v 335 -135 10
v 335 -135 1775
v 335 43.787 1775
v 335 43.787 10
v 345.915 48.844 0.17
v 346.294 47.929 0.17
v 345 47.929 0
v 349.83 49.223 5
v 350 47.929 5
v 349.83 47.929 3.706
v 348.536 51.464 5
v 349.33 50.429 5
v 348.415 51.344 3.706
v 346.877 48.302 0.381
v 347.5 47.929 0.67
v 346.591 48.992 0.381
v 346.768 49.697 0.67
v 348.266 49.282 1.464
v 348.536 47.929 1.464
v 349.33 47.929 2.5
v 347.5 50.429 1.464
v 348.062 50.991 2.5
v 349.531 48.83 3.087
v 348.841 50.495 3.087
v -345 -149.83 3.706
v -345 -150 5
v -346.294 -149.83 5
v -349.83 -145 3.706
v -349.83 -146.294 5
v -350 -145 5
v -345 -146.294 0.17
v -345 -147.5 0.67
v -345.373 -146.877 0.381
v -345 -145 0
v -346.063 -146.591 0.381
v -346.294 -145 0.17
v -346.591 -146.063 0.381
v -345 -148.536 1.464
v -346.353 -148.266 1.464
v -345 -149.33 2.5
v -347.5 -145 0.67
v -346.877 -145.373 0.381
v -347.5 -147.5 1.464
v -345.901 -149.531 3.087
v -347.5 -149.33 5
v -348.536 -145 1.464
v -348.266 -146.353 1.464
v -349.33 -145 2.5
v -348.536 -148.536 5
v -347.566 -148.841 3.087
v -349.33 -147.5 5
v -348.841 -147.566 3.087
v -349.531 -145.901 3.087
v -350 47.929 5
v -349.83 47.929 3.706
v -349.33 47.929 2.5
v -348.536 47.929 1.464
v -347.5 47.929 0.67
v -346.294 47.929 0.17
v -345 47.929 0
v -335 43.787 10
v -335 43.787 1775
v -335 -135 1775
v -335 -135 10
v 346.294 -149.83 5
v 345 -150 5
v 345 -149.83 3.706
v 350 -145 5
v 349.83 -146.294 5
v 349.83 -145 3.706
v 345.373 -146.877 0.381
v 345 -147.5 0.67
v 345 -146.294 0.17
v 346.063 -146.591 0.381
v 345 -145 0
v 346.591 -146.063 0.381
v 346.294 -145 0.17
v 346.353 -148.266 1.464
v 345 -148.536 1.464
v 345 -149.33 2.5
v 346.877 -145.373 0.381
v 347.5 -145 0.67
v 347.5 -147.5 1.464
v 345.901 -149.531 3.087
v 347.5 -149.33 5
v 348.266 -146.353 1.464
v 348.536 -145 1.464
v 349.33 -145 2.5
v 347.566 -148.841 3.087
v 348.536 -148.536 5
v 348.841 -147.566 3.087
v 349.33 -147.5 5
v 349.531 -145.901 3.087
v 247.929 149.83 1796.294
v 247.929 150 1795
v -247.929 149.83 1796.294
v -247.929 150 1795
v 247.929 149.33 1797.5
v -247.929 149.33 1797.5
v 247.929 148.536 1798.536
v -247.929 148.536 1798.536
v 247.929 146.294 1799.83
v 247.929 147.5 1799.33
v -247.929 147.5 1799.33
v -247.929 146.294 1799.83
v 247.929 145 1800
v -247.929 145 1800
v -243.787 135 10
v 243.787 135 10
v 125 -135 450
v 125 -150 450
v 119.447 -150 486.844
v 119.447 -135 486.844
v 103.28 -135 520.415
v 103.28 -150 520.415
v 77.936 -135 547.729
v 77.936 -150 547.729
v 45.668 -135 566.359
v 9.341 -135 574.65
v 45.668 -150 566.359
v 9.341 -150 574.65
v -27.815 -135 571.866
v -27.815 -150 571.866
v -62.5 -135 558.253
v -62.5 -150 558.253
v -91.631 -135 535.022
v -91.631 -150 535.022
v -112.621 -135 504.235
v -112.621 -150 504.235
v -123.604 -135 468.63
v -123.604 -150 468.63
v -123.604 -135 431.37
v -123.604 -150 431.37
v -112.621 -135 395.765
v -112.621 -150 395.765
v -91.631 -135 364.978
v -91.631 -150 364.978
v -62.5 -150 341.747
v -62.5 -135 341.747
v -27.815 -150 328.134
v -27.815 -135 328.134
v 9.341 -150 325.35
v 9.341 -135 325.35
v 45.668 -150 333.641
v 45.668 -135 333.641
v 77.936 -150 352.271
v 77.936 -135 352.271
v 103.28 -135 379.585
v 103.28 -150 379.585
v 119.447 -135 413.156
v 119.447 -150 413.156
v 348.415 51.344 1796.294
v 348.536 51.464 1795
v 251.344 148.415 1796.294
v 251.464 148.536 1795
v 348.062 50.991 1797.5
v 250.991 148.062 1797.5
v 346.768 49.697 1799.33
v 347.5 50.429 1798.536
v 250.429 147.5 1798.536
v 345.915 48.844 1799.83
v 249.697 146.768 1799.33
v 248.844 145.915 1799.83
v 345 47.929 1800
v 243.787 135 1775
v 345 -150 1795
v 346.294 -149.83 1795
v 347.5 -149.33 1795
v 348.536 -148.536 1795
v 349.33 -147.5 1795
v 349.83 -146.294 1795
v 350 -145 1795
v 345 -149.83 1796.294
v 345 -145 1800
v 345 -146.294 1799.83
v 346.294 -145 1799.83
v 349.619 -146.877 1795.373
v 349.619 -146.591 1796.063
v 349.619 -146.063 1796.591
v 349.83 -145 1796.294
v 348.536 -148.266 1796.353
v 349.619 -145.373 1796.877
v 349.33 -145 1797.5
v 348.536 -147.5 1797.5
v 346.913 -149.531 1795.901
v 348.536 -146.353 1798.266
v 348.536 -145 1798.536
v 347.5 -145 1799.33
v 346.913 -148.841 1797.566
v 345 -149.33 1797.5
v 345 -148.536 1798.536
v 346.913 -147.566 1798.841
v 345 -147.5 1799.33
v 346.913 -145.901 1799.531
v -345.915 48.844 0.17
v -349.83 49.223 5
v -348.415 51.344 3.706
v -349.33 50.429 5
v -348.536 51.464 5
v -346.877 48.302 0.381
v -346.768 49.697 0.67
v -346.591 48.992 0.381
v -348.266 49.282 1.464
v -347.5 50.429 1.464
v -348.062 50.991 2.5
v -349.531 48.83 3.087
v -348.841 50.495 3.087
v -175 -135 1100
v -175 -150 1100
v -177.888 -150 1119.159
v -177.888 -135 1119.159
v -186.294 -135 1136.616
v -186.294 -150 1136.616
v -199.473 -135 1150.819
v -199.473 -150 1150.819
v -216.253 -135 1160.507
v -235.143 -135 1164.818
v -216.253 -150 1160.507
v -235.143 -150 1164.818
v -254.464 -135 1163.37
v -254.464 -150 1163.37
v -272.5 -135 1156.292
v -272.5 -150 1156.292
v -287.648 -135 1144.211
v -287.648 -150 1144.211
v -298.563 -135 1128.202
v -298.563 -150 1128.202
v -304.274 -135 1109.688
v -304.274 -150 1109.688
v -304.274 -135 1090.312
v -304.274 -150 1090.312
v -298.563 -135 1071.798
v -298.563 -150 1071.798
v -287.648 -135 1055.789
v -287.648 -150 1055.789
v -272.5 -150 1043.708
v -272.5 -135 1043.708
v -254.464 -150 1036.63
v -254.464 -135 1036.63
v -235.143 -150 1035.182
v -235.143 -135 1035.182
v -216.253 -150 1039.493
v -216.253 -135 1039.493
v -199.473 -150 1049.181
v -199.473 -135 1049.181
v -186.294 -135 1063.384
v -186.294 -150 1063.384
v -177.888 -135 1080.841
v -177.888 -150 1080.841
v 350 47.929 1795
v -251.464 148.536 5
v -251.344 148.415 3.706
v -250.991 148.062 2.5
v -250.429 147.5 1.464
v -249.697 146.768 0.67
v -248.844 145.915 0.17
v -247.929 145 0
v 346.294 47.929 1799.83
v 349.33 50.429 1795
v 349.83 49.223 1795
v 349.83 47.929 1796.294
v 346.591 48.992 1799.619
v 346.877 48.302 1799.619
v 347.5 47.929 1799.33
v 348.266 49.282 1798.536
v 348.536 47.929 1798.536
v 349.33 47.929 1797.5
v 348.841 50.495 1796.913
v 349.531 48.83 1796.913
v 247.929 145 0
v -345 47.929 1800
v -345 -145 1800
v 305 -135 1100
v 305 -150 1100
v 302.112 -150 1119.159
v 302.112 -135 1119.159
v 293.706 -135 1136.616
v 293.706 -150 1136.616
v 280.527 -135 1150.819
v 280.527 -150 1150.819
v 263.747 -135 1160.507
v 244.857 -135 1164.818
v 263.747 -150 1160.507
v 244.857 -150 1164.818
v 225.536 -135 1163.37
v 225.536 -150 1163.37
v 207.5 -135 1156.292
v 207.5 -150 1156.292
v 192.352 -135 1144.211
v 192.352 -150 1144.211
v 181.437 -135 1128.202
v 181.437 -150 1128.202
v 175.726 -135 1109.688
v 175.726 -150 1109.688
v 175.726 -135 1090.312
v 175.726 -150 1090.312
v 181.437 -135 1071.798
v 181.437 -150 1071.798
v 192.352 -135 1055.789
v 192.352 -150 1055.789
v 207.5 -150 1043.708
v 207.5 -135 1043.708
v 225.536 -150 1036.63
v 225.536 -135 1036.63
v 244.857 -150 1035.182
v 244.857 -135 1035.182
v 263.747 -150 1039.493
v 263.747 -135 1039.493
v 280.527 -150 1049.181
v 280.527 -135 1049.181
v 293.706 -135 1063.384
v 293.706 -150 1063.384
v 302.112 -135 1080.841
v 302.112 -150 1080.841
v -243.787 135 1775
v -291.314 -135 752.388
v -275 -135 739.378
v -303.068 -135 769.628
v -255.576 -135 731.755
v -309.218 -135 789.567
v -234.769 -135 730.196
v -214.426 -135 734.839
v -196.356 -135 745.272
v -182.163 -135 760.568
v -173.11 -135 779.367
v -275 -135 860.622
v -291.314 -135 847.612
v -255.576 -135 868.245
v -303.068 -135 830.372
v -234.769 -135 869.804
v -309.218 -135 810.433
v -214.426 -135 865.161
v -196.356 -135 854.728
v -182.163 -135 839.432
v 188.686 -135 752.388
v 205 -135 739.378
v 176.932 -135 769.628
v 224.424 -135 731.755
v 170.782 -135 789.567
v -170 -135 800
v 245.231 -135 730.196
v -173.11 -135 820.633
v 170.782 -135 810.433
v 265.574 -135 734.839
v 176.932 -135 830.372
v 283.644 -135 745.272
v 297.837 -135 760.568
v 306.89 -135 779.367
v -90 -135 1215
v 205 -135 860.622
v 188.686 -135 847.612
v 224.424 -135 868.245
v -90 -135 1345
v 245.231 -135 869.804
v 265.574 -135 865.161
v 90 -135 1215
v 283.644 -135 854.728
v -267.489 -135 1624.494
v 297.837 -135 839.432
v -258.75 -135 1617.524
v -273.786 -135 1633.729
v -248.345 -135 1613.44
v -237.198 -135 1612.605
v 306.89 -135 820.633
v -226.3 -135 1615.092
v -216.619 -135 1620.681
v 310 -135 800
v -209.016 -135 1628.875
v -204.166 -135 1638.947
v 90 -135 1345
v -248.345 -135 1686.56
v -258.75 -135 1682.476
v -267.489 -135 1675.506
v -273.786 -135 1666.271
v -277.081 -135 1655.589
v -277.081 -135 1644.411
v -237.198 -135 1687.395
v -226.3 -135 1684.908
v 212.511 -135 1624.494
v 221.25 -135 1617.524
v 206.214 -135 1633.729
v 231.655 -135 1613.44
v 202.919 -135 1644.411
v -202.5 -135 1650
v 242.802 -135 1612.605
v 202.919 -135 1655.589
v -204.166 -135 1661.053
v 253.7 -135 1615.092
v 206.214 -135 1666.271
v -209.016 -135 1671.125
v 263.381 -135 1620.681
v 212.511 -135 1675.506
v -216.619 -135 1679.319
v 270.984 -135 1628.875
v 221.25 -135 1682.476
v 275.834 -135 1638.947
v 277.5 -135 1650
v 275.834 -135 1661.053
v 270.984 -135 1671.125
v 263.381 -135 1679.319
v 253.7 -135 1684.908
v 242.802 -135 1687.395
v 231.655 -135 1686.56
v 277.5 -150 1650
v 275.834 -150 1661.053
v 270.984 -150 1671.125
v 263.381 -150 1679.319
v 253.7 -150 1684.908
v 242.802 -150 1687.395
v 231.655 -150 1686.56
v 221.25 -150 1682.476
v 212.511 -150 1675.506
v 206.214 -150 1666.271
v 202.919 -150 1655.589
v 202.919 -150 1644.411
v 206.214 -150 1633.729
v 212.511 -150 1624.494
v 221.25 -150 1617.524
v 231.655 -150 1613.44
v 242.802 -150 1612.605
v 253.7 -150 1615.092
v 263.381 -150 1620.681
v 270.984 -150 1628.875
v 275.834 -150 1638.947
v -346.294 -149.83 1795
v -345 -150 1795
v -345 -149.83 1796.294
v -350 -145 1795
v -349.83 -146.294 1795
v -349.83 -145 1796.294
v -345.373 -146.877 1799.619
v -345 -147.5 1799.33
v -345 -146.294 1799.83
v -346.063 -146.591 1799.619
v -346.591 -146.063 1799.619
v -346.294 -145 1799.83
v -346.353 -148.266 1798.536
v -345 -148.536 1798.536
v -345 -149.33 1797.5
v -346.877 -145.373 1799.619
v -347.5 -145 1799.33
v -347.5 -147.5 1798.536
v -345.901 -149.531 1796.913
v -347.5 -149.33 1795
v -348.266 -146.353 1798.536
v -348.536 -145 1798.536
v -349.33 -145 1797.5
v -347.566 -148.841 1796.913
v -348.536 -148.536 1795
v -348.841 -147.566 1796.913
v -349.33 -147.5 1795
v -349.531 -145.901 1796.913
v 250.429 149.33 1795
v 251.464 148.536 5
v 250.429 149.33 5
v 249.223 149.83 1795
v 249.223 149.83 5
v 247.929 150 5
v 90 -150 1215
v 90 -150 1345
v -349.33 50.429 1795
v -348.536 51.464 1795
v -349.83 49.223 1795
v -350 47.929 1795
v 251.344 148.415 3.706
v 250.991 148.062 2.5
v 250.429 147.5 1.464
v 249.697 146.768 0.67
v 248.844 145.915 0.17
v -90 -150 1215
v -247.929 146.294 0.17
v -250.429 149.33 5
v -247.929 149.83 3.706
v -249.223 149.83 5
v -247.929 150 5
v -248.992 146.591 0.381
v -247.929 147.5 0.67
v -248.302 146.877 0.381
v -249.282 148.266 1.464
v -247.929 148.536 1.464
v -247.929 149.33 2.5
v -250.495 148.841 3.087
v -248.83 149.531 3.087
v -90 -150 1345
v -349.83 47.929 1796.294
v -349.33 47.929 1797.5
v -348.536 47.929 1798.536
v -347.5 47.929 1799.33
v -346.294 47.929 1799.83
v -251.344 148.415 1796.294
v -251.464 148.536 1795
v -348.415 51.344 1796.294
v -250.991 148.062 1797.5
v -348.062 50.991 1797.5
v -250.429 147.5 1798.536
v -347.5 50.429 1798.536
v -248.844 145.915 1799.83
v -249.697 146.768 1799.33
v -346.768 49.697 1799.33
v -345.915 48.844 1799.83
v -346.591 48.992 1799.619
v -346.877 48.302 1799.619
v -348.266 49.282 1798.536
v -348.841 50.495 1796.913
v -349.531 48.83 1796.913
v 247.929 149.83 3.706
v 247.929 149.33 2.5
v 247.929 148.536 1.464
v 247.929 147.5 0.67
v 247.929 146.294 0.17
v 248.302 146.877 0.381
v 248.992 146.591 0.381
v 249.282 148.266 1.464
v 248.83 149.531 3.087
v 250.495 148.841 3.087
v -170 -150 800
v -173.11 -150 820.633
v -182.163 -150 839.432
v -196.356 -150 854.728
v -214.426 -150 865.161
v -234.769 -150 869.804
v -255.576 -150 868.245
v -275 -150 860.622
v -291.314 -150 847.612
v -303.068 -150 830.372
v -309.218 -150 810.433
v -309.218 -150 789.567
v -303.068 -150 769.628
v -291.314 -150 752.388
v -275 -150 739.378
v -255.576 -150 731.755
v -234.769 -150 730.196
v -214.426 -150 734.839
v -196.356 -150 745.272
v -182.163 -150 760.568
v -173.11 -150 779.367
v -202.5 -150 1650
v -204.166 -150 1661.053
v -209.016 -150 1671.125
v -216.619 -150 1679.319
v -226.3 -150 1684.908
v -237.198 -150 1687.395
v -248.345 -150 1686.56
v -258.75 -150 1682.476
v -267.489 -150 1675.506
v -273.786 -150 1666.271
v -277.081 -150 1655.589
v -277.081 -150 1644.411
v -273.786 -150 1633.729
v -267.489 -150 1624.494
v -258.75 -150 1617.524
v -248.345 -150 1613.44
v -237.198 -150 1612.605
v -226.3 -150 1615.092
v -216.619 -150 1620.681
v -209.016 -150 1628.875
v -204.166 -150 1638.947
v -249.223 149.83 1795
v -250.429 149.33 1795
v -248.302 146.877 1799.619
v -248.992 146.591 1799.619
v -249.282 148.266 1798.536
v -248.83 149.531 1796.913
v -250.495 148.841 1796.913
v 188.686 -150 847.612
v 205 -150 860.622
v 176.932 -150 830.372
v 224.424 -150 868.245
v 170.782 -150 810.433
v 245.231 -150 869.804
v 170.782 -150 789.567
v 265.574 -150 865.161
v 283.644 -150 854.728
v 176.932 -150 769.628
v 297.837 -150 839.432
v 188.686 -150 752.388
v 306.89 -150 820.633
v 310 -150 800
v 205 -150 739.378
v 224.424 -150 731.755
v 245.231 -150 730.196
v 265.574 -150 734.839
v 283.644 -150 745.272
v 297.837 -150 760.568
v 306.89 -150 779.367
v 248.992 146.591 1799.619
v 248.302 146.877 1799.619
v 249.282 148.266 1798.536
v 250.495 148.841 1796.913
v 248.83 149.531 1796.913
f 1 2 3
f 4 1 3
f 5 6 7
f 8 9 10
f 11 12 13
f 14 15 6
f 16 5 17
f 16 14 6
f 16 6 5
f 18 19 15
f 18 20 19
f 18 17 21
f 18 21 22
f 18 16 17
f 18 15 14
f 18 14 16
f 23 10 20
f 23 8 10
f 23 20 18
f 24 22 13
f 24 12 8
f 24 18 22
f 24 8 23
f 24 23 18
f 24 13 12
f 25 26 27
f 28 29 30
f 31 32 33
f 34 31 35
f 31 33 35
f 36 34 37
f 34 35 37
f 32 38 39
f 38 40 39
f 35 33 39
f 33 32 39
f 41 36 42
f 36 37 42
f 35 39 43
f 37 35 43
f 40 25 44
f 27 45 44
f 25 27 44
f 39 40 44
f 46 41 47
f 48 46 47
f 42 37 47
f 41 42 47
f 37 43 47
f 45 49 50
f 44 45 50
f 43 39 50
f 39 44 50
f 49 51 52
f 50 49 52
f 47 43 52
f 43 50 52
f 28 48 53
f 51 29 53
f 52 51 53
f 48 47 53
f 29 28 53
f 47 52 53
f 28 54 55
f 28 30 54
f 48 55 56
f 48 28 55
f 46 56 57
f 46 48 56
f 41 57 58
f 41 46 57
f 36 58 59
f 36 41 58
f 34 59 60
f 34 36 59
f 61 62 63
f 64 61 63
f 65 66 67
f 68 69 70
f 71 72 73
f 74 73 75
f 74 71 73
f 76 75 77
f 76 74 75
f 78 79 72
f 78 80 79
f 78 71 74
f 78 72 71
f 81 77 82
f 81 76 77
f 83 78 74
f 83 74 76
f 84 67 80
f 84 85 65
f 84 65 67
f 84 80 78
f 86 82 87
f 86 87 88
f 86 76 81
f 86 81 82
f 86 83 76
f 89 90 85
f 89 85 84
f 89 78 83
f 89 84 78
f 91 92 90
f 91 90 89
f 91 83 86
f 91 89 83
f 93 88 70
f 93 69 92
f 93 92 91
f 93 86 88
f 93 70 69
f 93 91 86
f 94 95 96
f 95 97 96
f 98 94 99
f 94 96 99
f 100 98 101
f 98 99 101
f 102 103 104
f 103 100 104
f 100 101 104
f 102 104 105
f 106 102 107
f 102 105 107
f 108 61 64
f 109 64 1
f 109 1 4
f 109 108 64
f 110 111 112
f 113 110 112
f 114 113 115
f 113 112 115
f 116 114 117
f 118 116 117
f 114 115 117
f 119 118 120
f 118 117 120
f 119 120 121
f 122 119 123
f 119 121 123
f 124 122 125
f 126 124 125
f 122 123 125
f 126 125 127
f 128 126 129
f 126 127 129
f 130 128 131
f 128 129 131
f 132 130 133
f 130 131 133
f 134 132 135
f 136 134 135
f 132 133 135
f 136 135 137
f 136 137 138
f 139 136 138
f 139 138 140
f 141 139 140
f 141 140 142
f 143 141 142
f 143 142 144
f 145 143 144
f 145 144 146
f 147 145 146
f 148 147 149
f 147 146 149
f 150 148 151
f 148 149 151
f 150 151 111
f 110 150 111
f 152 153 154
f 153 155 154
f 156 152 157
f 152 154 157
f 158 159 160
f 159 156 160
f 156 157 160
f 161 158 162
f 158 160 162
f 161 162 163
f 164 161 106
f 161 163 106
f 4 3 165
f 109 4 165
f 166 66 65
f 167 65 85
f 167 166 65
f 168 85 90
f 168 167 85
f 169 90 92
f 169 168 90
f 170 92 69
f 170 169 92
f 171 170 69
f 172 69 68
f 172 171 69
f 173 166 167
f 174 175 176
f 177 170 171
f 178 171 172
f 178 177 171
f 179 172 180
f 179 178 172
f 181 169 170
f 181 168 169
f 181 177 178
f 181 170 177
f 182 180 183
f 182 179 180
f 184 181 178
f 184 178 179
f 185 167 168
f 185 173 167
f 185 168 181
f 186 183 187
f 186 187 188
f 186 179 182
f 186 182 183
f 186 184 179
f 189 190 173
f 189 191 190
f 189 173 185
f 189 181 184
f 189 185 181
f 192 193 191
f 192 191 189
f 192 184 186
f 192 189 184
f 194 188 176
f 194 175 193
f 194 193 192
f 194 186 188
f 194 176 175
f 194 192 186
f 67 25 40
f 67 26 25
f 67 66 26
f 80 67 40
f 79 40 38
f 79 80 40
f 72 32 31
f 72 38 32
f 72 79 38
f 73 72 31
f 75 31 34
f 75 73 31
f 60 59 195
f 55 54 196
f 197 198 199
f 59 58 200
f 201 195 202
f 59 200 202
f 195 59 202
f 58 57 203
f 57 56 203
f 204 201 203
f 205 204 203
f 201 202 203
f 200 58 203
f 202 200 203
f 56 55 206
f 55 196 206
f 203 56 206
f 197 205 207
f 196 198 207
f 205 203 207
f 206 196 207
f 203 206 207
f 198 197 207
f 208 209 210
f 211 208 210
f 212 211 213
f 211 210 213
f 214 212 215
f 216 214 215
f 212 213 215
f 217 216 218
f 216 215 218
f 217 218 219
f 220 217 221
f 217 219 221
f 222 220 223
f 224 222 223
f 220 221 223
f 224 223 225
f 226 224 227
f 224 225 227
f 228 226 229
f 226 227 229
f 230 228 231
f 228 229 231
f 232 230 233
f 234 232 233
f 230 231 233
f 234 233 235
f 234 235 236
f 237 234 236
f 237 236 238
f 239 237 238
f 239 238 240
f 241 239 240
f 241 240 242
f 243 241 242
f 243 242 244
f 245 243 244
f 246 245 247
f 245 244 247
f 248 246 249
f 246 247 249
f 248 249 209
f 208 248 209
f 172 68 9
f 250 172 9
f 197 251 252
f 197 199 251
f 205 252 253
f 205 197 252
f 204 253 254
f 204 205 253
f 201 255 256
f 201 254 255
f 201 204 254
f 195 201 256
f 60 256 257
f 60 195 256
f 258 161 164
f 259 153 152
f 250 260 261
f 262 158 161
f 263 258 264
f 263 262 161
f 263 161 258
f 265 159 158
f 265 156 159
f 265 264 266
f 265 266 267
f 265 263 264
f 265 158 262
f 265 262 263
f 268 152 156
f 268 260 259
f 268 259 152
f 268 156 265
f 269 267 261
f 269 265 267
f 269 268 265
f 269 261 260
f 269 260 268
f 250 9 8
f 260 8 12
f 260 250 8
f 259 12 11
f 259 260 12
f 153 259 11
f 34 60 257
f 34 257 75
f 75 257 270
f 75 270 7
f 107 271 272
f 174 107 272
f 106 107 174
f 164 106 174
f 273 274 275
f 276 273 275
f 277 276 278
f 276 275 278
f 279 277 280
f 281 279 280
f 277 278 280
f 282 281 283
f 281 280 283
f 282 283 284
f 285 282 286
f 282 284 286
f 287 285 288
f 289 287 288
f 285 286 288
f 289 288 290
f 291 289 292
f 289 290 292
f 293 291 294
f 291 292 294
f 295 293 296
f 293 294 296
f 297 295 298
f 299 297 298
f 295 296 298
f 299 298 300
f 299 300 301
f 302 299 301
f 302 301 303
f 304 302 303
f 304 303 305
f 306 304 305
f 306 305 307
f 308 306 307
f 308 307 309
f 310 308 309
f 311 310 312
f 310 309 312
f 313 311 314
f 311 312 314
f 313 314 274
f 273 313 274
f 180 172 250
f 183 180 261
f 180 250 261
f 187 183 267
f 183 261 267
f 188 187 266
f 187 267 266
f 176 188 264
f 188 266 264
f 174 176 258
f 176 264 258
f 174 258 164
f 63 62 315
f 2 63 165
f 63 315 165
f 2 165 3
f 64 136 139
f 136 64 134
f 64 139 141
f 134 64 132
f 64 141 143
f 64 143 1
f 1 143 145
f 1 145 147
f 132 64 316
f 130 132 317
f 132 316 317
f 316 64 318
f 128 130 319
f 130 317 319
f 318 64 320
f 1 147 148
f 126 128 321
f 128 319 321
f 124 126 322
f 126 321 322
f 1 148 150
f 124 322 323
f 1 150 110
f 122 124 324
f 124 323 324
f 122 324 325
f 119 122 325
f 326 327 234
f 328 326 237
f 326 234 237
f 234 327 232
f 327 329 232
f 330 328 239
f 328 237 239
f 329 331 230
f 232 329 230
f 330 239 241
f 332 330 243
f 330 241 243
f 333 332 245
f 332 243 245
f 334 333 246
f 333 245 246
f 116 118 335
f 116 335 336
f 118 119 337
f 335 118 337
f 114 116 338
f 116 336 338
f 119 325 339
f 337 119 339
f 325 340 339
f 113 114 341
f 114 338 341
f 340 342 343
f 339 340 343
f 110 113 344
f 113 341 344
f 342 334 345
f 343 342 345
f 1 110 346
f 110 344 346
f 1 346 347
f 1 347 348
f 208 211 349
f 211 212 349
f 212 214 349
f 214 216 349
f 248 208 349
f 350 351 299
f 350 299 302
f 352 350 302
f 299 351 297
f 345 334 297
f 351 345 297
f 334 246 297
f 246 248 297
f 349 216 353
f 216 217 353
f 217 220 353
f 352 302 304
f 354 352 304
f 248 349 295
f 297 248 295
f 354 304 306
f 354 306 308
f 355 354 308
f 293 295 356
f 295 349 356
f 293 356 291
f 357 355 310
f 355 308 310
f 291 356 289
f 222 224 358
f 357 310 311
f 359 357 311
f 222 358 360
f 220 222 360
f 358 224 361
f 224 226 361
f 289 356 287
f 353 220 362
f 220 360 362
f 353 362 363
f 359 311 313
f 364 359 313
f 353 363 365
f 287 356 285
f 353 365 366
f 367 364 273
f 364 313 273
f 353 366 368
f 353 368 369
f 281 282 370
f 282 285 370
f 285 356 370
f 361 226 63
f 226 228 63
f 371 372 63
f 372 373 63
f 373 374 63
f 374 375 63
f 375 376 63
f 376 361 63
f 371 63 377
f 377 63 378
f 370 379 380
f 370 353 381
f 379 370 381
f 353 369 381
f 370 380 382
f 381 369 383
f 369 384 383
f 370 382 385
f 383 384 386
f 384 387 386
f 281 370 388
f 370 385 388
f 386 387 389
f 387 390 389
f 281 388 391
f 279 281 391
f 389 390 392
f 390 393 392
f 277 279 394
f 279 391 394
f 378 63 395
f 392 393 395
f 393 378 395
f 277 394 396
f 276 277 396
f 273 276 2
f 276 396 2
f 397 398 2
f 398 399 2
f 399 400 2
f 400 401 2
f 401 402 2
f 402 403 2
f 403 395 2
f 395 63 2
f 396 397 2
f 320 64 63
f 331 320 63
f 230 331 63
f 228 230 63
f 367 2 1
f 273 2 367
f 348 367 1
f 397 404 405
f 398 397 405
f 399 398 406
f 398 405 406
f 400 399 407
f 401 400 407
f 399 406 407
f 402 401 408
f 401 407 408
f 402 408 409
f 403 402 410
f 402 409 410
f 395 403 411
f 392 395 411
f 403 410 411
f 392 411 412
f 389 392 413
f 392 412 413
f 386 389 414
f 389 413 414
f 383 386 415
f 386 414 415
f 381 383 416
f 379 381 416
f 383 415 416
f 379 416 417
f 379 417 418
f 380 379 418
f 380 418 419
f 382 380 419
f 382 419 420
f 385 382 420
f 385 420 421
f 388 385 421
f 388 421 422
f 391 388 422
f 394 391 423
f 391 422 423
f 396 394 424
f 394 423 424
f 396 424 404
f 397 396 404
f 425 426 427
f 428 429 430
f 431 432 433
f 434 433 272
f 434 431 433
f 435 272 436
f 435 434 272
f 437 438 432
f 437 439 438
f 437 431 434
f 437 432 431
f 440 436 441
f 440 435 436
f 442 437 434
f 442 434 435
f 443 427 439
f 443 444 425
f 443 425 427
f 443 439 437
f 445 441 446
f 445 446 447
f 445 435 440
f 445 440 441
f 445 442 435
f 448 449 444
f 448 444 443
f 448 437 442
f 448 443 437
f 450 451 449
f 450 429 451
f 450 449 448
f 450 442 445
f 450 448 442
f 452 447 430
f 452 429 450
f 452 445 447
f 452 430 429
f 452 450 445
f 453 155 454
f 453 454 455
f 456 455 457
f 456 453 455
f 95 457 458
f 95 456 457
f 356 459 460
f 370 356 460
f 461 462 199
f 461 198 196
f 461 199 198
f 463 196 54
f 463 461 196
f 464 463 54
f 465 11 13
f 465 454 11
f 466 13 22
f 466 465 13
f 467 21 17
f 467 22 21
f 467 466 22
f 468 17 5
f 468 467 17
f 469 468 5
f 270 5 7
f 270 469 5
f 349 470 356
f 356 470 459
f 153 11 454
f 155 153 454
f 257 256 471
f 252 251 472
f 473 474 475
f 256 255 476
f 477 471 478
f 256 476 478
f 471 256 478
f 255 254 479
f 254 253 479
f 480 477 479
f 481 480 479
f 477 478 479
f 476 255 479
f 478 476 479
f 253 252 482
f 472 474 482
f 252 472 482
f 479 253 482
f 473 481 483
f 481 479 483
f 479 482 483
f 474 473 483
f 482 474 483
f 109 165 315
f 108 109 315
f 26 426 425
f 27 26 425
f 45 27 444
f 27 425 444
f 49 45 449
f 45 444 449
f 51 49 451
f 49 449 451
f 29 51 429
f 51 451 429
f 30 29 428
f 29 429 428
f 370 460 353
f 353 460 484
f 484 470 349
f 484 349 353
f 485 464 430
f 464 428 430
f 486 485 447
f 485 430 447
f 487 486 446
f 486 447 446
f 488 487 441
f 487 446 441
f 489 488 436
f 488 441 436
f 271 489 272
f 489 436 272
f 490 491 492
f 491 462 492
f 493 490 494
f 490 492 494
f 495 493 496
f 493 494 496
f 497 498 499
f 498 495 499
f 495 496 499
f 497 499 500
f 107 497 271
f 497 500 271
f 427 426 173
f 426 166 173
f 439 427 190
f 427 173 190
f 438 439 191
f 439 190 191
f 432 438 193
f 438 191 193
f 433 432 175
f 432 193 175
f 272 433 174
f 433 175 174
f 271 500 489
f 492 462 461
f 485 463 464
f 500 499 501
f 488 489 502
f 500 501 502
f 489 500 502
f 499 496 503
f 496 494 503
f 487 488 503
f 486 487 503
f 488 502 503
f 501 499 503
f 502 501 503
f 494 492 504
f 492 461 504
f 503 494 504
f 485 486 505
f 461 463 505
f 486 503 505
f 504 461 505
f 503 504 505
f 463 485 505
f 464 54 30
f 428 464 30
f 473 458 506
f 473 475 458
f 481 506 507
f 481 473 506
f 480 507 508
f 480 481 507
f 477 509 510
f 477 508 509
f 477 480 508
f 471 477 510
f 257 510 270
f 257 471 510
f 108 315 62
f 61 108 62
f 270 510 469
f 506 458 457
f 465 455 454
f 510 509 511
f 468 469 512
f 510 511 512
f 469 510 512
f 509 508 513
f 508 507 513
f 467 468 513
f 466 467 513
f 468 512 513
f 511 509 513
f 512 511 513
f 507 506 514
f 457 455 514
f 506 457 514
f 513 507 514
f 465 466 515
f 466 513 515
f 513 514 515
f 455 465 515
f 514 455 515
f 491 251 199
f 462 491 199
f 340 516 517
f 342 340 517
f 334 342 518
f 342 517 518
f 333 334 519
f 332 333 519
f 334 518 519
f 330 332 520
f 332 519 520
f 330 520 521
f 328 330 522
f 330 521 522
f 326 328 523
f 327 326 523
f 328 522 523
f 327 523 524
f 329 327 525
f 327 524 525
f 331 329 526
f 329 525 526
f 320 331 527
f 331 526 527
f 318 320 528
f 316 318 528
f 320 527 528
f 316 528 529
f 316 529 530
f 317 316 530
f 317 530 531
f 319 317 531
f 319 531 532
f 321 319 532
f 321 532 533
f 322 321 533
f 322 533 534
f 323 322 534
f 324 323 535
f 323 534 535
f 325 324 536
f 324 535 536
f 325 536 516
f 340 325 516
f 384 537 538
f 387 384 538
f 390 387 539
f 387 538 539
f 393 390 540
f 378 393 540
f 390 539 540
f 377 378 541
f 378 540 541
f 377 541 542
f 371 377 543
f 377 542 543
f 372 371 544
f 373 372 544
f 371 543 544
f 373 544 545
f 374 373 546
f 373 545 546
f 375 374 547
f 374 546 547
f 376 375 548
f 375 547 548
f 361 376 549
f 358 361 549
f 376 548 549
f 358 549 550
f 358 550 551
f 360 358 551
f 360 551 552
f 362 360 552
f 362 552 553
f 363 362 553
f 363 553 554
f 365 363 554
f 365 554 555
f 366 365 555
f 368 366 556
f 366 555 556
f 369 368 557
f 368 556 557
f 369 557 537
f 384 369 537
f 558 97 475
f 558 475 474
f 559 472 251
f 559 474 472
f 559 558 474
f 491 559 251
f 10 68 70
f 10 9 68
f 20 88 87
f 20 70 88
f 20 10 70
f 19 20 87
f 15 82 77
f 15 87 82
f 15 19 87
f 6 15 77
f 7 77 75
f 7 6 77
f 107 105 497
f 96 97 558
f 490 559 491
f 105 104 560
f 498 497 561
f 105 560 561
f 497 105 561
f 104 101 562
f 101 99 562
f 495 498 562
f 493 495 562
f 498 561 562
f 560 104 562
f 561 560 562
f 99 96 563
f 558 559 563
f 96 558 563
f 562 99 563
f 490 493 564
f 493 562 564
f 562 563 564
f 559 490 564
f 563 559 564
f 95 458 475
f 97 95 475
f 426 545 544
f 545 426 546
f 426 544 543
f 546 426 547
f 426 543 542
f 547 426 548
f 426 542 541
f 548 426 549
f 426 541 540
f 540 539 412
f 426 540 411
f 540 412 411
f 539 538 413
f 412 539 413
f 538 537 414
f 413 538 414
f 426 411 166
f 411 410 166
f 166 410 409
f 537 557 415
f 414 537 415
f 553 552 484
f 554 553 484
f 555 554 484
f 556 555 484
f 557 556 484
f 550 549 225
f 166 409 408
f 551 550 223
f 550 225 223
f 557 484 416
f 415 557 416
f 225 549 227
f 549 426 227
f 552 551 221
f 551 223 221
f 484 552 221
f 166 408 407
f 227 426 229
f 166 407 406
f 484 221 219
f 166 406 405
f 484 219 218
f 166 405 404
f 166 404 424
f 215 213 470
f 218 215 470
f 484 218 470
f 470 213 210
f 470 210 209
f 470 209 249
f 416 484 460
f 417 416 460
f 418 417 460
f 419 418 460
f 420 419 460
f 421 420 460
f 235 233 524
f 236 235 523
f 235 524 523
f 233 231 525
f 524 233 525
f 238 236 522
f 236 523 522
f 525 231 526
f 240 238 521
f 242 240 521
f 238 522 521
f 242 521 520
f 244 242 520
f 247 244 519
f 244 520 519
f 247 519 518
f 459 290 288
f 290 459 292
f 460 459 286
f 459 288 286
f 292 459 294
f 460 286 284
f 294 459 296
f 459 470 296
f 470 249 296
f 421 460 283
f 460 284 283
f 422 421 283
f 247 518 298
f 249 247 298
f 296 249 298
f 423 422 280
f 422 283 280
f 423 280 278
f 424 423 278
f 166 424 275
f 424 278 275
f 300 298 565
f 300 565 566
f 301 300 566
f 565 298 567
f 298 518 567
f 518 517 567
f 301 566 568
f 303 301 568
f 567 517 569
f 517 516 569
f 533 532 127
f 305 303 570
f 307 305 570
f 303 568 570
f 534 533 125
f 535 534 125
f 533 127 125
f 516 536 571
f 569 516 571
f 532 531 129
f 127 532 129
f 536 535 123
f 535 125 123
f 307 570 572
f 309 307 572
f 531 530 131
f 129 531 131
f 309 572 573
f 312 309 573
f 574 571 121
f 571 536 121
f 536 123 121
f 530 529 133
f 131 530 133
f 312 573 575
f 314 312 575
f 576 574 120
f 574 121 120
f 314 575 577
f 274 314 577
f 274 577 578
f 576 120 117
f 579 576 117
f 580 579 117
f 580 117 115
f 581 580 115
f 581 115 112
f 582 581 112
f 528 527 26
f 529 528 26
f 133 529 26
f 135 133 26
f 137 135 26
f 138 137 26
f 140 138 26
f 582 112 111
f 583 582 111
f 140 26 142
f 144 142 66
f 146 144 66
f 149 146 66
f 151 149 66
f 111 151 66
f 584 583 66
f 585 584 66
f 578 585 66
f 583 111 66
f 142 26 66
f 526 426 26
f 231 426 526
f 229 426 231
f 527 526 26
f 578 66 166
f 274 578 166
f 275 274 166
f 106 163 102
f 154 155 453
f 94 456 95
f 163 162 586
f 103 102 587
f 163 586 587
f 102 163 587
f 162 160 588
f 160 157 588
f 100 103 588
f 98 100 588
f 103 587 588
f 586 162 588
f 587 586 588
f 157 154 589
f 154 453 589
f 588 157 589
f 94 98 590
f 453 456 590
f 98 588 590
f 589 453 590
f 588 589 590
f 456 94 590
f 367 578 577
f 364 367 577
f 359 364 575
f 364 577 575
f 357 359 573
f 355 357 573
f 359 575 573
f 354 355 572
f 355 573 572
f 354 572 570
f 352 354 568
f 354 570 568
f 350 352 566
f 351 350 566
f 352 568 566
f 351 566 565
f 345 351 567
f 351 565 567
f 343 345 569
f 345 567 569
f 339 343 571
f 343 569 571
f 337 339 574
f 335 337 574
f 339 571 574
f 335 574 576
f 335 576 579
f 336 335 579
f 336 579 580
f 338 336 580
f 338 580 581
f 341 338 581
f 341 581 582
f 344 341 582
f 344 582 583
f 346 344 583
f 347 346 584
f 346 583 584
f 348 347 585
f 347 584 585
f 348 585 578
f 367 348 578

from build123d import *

# Parameters (mm, degrees)
F1_DEPTH  = 1800
F2_R      = 5
F3_W      = 90
F3_H      = 130
F4_DEPTH  = 25
F6_DEPTH  = 1790
F7_R      = 37.5
F7_R_2    = 65
F7_R_3    = 70
F8_DEPTH  = 15
F10_START = 1775
F10_DEPTH = 25


with BuildPart() as f1:
    # F0 (on Top) → F1 (new body)
    with BuildSketch(Plane.XY):
        Polygon((-350, -150), (350, -150), (350, 50), (250, 150), (0, 150), (-250, 150), (-350, 50), align=None)
    extrude(amount=F1_DEPTH)

    # F2
    f2_edges = [f1.edges().sort_by_distance(p)[0] for p in [
        (-350, -150, 900),
        (0, -150, 1800),
        (350, -150, 900),
        (0, -150, 0),
        (350, -50, 0),
        (-350, -50, 0),
        (-300, 100, 0),
        (0, 150, 0),
        (300, 100, 0),
        (350, 50, 900),
        (250, 150, 900),
        (300, 100, 1800),
        (0, 150, 1800),
        (350, -50, 1800),
        (-300, 100, 1800),
        (-350, -50, 1800),
        (-350, 50, 900),
        (-250, 150, 900),
    ]]
    fillet(f2_edges, radius=F2_R)

    # F3 (on face) → F4 (cut)
    with BuildSketch(Plane.XZ.offset(150)):
        with Locations((-45, 1280)):
            Rectangle(F3_W, F3_H)
        with Locations((45, 1280)):
            Rectangle(F3_W, F3_H)
    extrude(amount=-F4_DEPTH, mode=Mode.SUBTRACT)

    # F5 (on face) → F6 (cut)
    with BuildSketch(Plane.XY.offset(1800)):
        Polygon((335, 43.7867965644), (243.7867965644, 135), (-243.7867965644, 135), (-335, 43.7867965644), (-335, -135), (335, -135), align=None)
    extrude(amount=-F6_DEPTH, mode=Mode.SUBTRACT)

    # F7 (on face) → F8 (cut, through all)
    with BuildSketch(Plane.XZ.offset(150)):
        with Locations((240, 1650)):
            Circle(F7_R)
        with Locations((240, 1100)):
            Circle(F7_R_2)
        with BuildLine():
            ThreePointArc((125, 450), (88.3883476483, 538.3883476483), (0, 575))
            Line((0, 575), (0, 325))
            ThreePointArc((0, 325), (88.3883476483, 361.6116523517), (125, 450))
        make_face()
        with BuildLine():
            Line((0, 325), (0, 575))
            ThreePointArc((0, 575), (-125, 450), (0, 325))
        make_face()
        with Locations((240, 800)):
            Circle(F7_R_3)
        with Locations((-240, 1650)):
            Circle(F7_R)
        with Locations((-240, 1100)):
            Circle(F7_R_2)
        with Locations((-240, 800)):
            Circle(F7_R_3)
    extrude(amount=-F8_DEPTH, mode=Mode.SUBTRACT)

    # F9 (on Top) → F10 (join)
    with BuildSketch(Plane.XY.offset(F10_START)):
        Polygon((340, 45.8578643763), (245.8578643763, 140), (-245.8578643763, 140), (-340, 45.8578643763), (-340, -140), (340, -140), align=None)
    extrude(amount=F10_DEPTH)


solid = f1.part
